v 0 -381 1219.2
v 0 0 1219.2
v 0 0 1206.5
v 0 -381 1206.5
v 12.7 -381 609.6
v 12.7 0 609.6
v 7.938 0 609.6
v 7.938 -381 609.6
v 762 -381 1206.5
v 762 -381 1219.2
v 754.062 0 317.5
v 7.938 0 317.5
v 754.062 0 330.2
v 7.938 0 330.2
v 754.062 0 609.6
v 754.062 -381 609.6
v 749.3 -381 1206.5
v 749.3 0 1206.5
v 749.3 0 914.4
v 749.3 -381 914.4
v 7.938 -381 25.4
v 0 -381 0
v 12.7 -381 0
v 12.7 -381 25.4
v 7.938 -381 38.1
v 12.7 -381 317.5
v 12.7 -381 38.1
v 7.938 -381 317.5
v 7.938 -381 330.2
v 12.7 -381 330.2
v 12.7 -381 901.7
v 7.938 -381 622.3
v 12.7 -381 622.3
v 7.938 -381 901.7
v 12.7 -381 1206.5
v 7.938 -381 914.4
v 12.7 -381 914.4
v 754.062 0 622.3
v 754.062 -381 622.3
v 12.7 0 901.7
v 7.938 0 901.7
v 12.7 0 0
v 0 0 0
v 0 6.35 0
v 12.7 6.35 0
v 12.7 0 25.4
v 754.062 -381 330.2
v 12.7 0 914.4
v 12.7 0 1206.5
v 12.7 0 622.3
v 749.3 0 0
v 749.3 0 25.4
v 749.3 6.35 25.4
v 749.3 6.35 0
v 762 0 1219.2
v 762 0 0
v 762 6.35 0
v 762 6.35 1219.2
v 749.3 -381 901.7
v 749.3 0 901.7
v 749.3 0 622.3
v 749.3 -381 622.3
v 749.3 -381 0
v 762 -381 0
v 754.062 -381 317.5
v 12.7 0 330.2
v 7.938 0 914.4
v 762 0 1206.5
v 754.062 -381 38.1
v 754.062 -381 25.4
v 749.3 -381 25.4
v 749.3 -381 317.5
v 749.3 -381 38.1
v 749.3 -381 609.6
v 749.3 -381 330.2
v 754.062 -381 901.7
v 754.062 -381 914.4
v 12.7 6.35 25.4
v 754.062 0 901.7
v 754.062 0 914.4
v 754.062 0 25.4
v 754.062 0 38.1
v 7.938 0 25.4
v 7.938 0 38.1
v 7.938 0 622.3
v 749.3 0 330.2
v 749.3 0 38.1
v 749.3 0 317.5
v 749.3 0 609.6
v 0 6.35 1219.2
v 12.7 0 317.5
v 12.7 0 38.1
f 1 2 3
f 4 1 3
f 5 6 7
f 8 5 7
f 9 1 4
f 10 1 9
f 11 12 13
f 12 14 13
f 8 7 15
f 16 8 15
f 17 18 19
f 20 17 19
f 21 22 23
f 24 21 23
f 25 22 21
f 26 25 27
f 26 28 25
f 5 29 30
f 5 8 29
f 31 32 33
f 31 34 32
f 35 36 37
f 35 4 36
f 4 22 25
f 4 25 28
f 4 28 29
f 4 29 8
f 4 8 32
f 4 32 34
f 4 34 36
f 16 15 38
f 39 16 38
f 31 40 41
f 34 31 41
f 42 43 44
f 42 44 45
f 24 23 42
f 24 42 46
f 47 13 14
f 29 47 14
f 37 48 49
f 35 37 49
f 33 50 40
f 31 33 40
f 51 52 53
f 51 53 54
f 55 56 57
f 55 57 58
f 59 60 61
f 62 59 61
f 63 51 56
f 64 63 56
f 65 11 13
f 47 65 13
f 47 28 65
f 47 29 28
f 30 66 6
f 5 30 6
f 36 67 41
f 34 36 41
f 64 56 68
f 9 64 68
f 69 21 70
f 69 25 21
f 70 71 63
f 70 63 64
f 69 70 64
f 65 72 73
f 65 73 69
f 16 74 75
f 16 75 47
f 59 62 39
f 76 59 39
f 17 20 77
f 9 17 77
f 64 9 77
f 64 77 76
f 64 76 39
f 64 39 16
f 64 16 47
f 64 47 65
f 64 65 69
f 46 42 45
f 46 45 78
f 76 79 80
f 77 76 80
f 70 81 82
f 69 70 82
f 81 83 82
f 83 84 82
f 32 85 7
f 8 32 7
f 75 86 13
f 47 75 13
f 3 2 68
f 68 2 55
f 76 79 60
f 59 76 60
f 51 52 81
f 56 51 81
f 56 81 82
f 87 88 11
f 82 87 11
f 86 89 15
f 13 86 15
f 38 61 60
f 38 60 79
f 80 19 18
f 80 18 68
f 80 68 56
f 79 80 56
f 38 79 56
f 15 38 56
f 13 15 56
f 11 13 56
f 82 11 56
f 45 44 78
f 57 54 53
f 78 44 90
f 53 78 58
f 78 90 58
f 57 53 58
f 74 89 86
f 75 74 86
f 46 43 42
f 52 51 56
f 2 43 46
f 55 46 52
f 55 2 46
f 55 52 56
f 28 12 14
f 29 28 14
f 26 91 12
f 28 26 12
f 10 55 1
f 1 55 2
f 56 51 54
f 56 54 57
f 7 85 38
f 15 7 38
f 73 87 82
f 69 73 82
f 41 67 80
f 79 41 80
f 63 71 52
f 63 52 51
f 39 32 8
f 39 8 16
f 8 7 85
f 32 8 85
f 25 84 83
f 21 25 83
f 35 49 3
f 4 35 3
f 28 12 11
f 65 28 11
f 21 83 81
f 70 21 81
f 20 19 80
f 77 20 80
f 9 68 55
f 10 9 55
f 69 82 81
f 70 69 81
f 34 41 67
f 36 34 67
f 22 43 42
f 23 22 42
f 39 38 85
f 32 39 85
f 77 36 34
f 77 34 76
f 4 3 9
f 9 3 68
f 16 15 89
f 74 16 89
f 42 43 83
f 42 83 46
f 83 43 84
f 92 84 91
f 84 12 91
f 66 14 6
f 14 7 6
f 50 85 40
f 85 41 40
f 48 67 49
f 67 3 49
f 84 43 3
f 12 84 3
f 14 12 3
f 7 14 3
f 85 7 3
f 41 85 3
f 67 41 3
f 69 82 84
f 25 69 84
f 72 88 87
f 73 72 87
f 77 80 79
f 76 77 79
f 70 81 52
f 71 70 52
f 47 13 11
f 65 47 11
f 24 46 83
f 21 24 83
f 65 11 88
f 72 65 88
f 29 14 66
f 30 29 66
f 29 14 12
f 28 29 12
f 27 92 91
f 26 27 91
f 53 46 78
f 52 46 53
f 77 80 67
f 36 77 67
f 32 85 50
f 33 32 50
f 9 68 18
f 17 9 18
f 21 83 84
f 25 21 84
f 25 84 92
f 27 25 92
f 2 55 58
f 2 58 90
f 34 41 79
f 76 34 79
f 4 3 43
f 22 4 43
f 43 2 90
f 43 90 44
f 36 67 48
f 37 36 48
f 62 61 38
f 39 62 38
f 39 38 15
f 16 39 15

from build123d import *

# Parameters (mm, degrees)
F1_DEPTH = 381
F2_DEPTH = 381
F0_W     = 736.6
F0_H     = 292.1
F0_H_2   = 279.4
F3_DEPTH = 6.35


with BuildPart() as f1:
    # F0 (on Front) → F1 (new body)
    with BuildSketch(Plane.XZ):
        Polygon((754.0625, 25.4), (749.3, 25.4), (749.3, 0), (762, 0), (762, 1206.5), (749.3, 1206.5), (749.3, 914.4), (754.0625, 914.4), (754.0625, 901.7), (749.3, 901.7), (749.3, 622.3), (754.0625, 622.3), (754.0625, 609.6), (749.3, 609.6), (749.3, 330.2), (754.0625, 330.2), (754.0625, 317.5), (749.3, 317.5), (749.3, 38.1), (754.0625, 38.1), align=None)
        Polygon((0, 1206.5), (0, 0), (12.7, 0), (12.7, 25.4), (7.9375, 25.4), (7.9375, 38.1), (12.7, 38.1), (12.7, 317.5), (7.9375, 317.5), (7.9375, 330.2), (12.7, 330.2), (12.7, 609.6), (7.9375, 609.6), (7.9375, 622.3), (12.7, 622.3), (12.7, 901.7), (7.9375, 901.7), (7.9375, 914.4), (12.7, 914.4), (12.7, 1206.5), align=None)
    extrude(amount=F1_DEPTH)


with BuildPart() as f2:
    # F0 (on Front) → F2 (new body)
    with BuildSketch(Plane.XZ):
        Polygon((7.9375, 25.4), (12.7, 25.4), (749.3, 25.4), (754.0625, 25.4), (754.0625, 38.1), (749.3, 38.1), (12.7, 38.1), (7.9375, 38.1), align=None)
        Polygon((7.9375, 317.5), (12.7, 317.5), (749.3, 317.5), (754.0625, 317.5), (754.0625, 330.2), (749.3, 330.2), (12.7, 330.2), (7.9375, 330.2), align=None)
        Polygon((749.3, 622.3), (12.7, 622.3), (7.9375, 622.3), (7.9375, 609.6), (12.7, 609.6), (749.3, 609.6), (754.0625, 609.6), (754.0625, 622.3), align=None)
        Polygon((749.3, 914.4), (12.7, 914.4), (7.9375, 914.4), (7.9375, 901.7), (12.7, 901.7), (749.3, 901.7), (754.0625, 901.7), (754.0625, 914.4), align=None)
        Polygon((0, 1219.2), (0, 1206.5), (12.7, 1206.5), (749.3, 1206.5), (762, 1206.5), (762, 1219.2), align=None)
    extrude(amount=F2_DEPTH)


with BuildPart() as f3:
    # F0 (on Front) → F3 (new body)
    with BuildSketch(Plane.XZ):
        with Locations((381, 1060.45)):
            Rectangle(F0_W, F0_H)
        with Locations((381, 762)):
            Rectangle(F0_W, F0_H_2)
        with Locations((381, 469.9)):
            Rectangle(F0_W, F0_H_2)
        with Locations((381, 177.8)):
            Rectangle(F0_W, F0_H_2)
        Polygon((754.0625, 25.4), (749.3, 25.4), (749.3, 0), (762, 0), (762, 1206.5), (749.3, 1206.5), (749.3, 914.4), (754.0625, 914.4), (754.0625, 901.7), (749.3, 901.7), (749.3, 622.3), (754.0625, 622.3), (754.0625, 609.6), (749.3, 609.6), (749.3, 330.2), (754.0625, 330.2), (754.0625, 317.5), (749.3, 317.5), (749.3, 38.1), (754.0625, 38.1), align=None)
        Polygon((0, 1206.5), (0, 0), (12.7, 0), (12.7, 25.4), (7.9375, 25.4), (7.9375, 38.1), (12.7, 38.1), (12.7, 317.5), (7.9375, 317.5), (7.9375, 330.2), (12.7, 330.2), (12.7, 609.6), (7.9375, 609.6), (7.9375, 622.3), (12.7, 622.3), (12.7, 901.7), (7.9375, 901.7), (7.9375, 914.4), (12.7, 914.4), (12.7, 1206.5), align=None)
        Polygon((0, 1219.2), (0, 1206.5), (12.7, 1206.5), (749.3, 1206.5), (762, 1206.5), (762, 1219.2), align=None)
        Polygon((749.3, 914.4), (12.7, 914.4), (7.9375, 914.4), (7.9375, 901.7), (12.7, 901.7), (749.3, 901.7), (754.0625, 901.7), (754.0625, 914.4), align=None)
        Polygon((749.3, 622.3), (12.7, 622.3), (7.9375, 622.3), (7.9375, 609.6), (12.7, 609.6), (749.3, 609.6), (754.0625, 609.6), (754.0625, 622.3), align=None)
        Polygon((7.9375, 317.5), (12.7, 317.5), (749.3, 317.5), (754.0625, 317.5), (754.0625, 330.2), (749.3, 330.2), (12.7, 330.2), (7.9375, 330.2), align=None)
        Polygon((7.9375, 25.4), (12.7, 25.4), (749.3, 25.4), (754.0625, 25.4), (754.0625, 38.1), (749.3, 38.1), (12.7, 38.1), (7.9375, 38.1), align=None)
    extrude(amount=-F3_DEPTH)


solid = Compound([f1.part, f2.part, f3.part])
